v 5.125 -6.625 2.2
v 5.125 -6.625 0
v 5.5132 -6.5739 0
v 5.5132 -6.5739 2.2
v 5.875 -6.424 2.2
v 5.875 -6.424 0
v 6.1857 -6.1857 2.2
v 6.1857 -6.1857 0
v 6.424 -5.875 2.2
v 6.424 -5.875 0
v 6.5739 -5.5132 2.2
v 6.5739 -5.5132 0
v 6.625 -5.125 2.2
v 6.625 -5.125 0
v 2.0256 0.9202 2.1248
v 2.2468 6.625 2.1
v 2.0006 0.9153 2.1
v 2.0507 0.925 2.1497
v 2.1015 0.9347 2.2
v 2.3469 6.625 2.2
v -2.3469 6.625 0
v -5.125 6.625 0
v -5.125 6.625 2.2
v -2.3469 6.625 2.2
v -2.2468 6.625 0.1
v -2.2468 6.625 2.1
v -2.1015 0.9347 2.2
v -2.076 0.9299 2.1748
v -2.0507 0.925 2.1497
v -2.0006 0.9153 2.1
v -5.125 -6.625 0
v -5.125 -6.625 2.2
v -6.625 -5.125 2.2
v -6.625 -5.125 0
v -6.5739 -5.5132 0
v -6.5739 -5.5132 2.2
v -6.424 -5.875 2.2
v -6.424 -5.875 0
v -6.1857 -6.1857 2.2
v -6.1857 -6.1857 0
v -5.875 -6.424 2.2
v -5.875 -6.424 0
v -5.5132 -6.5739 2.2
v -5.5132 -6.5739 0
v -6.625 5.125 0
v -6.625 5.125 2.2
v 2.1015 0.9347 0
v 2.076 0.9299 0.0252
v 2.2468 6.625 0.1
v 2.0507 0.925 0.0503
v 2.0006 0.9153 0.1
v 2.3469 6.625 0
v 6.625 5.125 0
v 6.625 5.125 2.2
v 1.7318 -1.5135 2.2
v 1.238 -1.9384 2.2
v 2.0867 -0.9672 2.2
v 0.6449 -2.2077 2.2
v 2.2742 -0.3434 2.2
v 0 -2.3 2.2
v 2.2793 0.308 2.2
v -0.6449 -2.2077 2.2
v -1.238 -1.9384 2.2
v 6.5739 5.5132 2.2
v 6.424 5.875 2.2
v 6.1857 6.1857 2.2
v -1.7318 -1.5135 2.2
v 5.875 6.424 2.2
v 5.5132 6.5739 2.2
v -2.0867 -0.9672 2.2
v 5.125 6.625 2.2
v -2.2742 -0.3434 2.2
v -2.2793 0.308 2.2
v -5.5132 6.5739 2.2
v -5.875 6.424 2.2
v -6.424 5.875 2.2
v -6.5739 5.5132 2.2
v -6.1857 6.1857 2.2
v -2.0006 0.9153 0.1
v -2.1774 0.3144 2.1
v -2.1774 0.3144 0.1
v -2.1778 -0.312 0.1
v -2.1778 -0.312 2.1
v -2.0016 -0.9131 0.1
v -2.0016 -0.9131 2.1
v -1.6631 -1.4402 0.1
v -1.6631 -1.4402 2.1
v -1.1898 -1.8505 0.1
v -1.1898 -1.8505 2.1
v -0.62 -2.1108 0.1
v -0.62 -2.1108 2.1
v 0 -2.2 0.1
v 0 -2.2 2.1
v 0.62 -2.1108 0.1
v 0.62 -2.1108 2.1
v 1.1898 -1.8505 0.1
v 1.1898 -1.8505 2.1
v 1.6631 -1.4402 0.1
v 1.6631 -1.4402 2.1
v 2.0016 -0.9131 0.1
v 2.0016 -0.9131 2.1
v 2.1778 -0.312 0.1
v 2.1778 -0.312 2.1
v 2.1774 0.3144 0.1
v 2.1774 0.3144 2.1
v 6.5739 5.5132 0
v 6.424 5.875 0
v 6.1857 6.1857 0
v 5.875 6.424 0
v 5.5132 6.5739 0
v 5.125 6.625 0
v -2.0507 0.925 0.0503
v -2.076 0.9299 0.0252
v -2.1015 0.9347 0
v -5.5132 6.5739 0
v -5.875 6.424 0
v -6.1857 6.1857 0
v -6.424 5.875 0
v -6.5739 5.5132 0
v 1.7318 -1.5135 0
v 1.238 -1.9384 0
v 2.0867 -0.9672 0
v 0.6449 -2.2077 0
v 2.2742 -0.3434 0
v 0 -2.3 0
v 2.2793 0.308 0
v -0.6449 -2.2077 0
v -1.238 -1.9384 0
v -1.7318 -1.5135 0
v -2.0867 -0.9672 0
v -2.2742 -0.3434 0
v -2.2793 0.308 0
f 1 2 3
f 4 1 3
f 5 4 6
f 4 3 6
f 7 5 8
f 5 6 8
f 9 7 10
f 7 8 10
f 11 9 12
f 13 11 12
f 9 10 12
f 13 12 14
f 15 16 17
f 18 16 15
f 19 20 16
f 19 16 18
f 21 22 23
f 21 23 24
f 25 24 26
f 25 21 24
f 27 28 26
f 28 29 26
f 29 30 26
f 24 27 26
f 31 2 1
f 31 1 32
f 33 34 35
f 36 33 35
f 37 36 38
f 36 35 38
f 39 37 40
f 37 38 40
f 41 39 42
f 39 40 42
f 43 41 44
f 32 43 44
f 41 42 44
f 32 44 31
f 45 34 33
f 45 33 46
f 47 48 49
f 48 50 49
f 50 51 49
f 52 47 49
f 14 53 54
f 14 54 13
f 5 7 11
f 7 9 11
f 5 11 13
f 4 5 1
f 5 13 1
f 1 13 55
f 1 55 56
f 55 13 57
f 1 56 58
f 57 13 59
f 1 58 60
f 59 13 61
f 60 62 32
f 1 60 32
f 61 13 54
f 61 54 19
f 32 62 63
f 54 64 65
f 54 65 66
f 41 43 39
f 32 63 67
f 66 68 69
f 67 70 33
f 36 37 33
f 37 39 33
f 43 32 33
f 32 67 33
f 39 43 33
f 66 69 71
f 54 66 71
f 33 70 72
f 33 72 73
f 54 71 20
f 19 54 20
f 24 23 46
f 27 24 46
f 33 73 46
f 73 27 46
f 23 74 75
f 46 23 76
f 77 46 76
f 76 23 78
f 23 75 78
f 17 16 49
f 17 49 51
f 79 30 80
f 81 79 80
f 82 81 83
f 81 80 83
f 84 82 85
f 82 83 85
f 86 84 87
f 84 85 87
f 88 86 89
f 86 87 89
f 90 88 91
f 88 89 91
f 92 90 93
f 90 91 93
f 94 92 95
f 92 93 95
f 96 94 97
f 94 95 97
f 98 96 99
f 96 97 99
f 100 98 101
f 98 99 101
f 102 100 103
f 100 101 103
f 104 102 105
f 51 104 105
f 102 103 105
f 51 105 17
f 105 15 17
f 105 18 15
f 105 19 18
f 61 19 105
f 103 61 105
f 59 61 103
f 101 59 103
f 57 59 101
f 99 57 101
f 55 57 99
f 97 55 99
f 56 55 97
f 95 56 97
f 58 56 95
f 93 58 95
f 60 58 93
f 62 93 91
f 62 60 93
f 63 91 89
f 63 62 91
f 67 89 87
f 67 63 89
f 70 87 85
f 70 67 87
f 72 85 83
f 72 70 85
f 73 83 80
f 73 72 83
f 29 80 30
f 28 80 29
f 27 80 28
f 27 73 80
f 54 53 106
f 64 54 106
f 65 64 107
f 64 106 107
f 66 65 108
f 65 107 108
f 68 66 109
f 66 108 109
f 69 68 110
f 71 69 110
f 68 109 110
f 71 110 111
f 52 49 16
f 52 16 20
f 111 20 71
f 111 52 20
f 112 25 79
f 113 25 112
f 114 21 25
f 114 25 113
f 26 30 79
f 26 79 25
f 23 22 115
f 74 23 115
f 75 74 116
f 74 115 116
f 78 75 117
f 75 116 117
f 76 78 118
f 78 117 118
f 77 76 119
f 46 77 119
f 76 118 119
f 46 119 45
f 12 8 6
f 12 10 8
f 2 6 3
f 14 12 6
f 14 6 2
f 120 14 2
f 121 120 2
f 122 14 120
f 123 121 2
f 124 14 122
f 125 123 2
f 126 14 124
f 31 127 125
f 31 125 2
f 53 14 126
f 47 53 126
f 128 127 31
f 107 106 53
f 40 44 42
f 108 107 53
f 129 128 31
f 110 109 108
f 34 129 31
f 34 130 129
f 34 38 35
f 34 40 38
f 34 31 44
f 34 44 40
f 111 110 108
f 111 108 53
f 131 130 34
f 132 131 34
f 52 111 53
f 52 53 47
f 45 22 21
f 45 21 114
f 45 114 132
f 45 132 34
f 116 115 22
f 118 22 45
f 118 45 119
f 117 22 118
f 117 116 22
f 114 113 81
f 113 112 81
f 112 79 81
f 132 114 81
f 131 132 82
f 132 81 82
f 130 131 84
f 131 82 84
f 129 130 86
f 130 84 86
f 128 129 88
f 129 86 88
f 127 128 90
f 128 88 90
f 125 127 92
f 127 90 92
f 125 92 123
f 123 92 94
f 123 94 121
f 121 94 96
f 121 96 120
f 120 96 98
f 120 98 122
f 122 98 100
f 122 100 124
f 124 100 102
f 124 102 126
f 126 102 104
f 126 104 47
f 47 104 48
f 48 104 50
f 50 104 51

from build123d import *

# Parameters (mm, degrees)
PAD_DEPTH       = 2.2
SKETCH001_R     = 2.2
POCKET_DEPTH    = 5
POCKET001_DEPTH = 5
CHAMFER_SIZE    = 0.1
CHAMFER001_SIZE = 0.1


with BuildPart() as part:
    # Sketch → Pad (new body)
    with BuildSketch(Plane.XY):
        with BuildLine():
            Line((-5.125, 6.625), (5.125, 6.625))
            ThreePointArc((6.625, 5.125), (6.18566, 6.18566), (5.125, 6.625))
            Line((6.625, 5.125), (6.625, -5.125))
            ThreePointArc((5.125, -6.625), (6.18566, -6.18566), (6.625, -5.125))
            Line((5.125, -6.625), (-5.125, -6.625))
            ThreePointArc((-6.625, -5.125), (-6.18566, -6.18566), (-5.125, -6.625))
            Line((-6.625, -5.125), (-6.625, 5.125))
            ThreePointArc((-5.125, 6.625), (-6.18566, 6.18566), (-6.625, 5.125))
        make_face()
    extrude(amount=PAD_DEPTH)

    # Sketch001 (on Face10 of Pad) → Pocket (cut)
    with BuildSketch(Plane.XY.offset(2.2)):
        Circle(SKETCH001_R)
    extrude(amount=-POCKET_DEPTH, mode=Mode.SUBTRACT)

    # Sketch002 (on Face5 of Pocket) → Pocket001 (cut)
    with BuildSketch(Plane.XY.offset(2.2)):
        with BuildLine():
            Line((-2, 0.902418), (-2.249768, 6.693066))
            ThreePointArc((-2, 6.95384), (-2.180545, 6.876765), (-2.249768, 6.693066))
            Line((-2, 6.95384), (2, 6.95384))
            ThreePointArc((2.249768, 6.693066), (2.180545, 6.876765), (2, 6.95384))
            Line((2.249768, 6.693066), (2, 0.902418))
            Line((2, 0.902418), (-2, 0.902418))
        make_face()
    extrude(amount=-POCKET001_DEPTH, mode=Mode.SUBTRACT)

    # Chamfer
    chamfer_edges = [part.edges().sort_by_distance(p)[0] for p in [
        (-2.123694, 3.770151, 2.2),
        (-0.46839, -2.149561, 2.2),
        (2.149561, 0.46839, 2.2),
        (2.123694, 3.770151, 2.2),
    ]]
    chamfer(chamfer_edges, length=CHAMFER_SIZE)

    # Chamfer001
    chamfer001_edges = [part.edges().sort_by_distance(p)[0] for p in [
        (2.149561, 0.46839, 0),
        (2.123694, 3.770151, 0),
        (-0.46839, -2.149561, 0),
        (-2.123694, 3.770151, 0),
    ]]
    chamfer(chamfer001_edges, length=CHAMFER001_SIZE)


solid = part.part
